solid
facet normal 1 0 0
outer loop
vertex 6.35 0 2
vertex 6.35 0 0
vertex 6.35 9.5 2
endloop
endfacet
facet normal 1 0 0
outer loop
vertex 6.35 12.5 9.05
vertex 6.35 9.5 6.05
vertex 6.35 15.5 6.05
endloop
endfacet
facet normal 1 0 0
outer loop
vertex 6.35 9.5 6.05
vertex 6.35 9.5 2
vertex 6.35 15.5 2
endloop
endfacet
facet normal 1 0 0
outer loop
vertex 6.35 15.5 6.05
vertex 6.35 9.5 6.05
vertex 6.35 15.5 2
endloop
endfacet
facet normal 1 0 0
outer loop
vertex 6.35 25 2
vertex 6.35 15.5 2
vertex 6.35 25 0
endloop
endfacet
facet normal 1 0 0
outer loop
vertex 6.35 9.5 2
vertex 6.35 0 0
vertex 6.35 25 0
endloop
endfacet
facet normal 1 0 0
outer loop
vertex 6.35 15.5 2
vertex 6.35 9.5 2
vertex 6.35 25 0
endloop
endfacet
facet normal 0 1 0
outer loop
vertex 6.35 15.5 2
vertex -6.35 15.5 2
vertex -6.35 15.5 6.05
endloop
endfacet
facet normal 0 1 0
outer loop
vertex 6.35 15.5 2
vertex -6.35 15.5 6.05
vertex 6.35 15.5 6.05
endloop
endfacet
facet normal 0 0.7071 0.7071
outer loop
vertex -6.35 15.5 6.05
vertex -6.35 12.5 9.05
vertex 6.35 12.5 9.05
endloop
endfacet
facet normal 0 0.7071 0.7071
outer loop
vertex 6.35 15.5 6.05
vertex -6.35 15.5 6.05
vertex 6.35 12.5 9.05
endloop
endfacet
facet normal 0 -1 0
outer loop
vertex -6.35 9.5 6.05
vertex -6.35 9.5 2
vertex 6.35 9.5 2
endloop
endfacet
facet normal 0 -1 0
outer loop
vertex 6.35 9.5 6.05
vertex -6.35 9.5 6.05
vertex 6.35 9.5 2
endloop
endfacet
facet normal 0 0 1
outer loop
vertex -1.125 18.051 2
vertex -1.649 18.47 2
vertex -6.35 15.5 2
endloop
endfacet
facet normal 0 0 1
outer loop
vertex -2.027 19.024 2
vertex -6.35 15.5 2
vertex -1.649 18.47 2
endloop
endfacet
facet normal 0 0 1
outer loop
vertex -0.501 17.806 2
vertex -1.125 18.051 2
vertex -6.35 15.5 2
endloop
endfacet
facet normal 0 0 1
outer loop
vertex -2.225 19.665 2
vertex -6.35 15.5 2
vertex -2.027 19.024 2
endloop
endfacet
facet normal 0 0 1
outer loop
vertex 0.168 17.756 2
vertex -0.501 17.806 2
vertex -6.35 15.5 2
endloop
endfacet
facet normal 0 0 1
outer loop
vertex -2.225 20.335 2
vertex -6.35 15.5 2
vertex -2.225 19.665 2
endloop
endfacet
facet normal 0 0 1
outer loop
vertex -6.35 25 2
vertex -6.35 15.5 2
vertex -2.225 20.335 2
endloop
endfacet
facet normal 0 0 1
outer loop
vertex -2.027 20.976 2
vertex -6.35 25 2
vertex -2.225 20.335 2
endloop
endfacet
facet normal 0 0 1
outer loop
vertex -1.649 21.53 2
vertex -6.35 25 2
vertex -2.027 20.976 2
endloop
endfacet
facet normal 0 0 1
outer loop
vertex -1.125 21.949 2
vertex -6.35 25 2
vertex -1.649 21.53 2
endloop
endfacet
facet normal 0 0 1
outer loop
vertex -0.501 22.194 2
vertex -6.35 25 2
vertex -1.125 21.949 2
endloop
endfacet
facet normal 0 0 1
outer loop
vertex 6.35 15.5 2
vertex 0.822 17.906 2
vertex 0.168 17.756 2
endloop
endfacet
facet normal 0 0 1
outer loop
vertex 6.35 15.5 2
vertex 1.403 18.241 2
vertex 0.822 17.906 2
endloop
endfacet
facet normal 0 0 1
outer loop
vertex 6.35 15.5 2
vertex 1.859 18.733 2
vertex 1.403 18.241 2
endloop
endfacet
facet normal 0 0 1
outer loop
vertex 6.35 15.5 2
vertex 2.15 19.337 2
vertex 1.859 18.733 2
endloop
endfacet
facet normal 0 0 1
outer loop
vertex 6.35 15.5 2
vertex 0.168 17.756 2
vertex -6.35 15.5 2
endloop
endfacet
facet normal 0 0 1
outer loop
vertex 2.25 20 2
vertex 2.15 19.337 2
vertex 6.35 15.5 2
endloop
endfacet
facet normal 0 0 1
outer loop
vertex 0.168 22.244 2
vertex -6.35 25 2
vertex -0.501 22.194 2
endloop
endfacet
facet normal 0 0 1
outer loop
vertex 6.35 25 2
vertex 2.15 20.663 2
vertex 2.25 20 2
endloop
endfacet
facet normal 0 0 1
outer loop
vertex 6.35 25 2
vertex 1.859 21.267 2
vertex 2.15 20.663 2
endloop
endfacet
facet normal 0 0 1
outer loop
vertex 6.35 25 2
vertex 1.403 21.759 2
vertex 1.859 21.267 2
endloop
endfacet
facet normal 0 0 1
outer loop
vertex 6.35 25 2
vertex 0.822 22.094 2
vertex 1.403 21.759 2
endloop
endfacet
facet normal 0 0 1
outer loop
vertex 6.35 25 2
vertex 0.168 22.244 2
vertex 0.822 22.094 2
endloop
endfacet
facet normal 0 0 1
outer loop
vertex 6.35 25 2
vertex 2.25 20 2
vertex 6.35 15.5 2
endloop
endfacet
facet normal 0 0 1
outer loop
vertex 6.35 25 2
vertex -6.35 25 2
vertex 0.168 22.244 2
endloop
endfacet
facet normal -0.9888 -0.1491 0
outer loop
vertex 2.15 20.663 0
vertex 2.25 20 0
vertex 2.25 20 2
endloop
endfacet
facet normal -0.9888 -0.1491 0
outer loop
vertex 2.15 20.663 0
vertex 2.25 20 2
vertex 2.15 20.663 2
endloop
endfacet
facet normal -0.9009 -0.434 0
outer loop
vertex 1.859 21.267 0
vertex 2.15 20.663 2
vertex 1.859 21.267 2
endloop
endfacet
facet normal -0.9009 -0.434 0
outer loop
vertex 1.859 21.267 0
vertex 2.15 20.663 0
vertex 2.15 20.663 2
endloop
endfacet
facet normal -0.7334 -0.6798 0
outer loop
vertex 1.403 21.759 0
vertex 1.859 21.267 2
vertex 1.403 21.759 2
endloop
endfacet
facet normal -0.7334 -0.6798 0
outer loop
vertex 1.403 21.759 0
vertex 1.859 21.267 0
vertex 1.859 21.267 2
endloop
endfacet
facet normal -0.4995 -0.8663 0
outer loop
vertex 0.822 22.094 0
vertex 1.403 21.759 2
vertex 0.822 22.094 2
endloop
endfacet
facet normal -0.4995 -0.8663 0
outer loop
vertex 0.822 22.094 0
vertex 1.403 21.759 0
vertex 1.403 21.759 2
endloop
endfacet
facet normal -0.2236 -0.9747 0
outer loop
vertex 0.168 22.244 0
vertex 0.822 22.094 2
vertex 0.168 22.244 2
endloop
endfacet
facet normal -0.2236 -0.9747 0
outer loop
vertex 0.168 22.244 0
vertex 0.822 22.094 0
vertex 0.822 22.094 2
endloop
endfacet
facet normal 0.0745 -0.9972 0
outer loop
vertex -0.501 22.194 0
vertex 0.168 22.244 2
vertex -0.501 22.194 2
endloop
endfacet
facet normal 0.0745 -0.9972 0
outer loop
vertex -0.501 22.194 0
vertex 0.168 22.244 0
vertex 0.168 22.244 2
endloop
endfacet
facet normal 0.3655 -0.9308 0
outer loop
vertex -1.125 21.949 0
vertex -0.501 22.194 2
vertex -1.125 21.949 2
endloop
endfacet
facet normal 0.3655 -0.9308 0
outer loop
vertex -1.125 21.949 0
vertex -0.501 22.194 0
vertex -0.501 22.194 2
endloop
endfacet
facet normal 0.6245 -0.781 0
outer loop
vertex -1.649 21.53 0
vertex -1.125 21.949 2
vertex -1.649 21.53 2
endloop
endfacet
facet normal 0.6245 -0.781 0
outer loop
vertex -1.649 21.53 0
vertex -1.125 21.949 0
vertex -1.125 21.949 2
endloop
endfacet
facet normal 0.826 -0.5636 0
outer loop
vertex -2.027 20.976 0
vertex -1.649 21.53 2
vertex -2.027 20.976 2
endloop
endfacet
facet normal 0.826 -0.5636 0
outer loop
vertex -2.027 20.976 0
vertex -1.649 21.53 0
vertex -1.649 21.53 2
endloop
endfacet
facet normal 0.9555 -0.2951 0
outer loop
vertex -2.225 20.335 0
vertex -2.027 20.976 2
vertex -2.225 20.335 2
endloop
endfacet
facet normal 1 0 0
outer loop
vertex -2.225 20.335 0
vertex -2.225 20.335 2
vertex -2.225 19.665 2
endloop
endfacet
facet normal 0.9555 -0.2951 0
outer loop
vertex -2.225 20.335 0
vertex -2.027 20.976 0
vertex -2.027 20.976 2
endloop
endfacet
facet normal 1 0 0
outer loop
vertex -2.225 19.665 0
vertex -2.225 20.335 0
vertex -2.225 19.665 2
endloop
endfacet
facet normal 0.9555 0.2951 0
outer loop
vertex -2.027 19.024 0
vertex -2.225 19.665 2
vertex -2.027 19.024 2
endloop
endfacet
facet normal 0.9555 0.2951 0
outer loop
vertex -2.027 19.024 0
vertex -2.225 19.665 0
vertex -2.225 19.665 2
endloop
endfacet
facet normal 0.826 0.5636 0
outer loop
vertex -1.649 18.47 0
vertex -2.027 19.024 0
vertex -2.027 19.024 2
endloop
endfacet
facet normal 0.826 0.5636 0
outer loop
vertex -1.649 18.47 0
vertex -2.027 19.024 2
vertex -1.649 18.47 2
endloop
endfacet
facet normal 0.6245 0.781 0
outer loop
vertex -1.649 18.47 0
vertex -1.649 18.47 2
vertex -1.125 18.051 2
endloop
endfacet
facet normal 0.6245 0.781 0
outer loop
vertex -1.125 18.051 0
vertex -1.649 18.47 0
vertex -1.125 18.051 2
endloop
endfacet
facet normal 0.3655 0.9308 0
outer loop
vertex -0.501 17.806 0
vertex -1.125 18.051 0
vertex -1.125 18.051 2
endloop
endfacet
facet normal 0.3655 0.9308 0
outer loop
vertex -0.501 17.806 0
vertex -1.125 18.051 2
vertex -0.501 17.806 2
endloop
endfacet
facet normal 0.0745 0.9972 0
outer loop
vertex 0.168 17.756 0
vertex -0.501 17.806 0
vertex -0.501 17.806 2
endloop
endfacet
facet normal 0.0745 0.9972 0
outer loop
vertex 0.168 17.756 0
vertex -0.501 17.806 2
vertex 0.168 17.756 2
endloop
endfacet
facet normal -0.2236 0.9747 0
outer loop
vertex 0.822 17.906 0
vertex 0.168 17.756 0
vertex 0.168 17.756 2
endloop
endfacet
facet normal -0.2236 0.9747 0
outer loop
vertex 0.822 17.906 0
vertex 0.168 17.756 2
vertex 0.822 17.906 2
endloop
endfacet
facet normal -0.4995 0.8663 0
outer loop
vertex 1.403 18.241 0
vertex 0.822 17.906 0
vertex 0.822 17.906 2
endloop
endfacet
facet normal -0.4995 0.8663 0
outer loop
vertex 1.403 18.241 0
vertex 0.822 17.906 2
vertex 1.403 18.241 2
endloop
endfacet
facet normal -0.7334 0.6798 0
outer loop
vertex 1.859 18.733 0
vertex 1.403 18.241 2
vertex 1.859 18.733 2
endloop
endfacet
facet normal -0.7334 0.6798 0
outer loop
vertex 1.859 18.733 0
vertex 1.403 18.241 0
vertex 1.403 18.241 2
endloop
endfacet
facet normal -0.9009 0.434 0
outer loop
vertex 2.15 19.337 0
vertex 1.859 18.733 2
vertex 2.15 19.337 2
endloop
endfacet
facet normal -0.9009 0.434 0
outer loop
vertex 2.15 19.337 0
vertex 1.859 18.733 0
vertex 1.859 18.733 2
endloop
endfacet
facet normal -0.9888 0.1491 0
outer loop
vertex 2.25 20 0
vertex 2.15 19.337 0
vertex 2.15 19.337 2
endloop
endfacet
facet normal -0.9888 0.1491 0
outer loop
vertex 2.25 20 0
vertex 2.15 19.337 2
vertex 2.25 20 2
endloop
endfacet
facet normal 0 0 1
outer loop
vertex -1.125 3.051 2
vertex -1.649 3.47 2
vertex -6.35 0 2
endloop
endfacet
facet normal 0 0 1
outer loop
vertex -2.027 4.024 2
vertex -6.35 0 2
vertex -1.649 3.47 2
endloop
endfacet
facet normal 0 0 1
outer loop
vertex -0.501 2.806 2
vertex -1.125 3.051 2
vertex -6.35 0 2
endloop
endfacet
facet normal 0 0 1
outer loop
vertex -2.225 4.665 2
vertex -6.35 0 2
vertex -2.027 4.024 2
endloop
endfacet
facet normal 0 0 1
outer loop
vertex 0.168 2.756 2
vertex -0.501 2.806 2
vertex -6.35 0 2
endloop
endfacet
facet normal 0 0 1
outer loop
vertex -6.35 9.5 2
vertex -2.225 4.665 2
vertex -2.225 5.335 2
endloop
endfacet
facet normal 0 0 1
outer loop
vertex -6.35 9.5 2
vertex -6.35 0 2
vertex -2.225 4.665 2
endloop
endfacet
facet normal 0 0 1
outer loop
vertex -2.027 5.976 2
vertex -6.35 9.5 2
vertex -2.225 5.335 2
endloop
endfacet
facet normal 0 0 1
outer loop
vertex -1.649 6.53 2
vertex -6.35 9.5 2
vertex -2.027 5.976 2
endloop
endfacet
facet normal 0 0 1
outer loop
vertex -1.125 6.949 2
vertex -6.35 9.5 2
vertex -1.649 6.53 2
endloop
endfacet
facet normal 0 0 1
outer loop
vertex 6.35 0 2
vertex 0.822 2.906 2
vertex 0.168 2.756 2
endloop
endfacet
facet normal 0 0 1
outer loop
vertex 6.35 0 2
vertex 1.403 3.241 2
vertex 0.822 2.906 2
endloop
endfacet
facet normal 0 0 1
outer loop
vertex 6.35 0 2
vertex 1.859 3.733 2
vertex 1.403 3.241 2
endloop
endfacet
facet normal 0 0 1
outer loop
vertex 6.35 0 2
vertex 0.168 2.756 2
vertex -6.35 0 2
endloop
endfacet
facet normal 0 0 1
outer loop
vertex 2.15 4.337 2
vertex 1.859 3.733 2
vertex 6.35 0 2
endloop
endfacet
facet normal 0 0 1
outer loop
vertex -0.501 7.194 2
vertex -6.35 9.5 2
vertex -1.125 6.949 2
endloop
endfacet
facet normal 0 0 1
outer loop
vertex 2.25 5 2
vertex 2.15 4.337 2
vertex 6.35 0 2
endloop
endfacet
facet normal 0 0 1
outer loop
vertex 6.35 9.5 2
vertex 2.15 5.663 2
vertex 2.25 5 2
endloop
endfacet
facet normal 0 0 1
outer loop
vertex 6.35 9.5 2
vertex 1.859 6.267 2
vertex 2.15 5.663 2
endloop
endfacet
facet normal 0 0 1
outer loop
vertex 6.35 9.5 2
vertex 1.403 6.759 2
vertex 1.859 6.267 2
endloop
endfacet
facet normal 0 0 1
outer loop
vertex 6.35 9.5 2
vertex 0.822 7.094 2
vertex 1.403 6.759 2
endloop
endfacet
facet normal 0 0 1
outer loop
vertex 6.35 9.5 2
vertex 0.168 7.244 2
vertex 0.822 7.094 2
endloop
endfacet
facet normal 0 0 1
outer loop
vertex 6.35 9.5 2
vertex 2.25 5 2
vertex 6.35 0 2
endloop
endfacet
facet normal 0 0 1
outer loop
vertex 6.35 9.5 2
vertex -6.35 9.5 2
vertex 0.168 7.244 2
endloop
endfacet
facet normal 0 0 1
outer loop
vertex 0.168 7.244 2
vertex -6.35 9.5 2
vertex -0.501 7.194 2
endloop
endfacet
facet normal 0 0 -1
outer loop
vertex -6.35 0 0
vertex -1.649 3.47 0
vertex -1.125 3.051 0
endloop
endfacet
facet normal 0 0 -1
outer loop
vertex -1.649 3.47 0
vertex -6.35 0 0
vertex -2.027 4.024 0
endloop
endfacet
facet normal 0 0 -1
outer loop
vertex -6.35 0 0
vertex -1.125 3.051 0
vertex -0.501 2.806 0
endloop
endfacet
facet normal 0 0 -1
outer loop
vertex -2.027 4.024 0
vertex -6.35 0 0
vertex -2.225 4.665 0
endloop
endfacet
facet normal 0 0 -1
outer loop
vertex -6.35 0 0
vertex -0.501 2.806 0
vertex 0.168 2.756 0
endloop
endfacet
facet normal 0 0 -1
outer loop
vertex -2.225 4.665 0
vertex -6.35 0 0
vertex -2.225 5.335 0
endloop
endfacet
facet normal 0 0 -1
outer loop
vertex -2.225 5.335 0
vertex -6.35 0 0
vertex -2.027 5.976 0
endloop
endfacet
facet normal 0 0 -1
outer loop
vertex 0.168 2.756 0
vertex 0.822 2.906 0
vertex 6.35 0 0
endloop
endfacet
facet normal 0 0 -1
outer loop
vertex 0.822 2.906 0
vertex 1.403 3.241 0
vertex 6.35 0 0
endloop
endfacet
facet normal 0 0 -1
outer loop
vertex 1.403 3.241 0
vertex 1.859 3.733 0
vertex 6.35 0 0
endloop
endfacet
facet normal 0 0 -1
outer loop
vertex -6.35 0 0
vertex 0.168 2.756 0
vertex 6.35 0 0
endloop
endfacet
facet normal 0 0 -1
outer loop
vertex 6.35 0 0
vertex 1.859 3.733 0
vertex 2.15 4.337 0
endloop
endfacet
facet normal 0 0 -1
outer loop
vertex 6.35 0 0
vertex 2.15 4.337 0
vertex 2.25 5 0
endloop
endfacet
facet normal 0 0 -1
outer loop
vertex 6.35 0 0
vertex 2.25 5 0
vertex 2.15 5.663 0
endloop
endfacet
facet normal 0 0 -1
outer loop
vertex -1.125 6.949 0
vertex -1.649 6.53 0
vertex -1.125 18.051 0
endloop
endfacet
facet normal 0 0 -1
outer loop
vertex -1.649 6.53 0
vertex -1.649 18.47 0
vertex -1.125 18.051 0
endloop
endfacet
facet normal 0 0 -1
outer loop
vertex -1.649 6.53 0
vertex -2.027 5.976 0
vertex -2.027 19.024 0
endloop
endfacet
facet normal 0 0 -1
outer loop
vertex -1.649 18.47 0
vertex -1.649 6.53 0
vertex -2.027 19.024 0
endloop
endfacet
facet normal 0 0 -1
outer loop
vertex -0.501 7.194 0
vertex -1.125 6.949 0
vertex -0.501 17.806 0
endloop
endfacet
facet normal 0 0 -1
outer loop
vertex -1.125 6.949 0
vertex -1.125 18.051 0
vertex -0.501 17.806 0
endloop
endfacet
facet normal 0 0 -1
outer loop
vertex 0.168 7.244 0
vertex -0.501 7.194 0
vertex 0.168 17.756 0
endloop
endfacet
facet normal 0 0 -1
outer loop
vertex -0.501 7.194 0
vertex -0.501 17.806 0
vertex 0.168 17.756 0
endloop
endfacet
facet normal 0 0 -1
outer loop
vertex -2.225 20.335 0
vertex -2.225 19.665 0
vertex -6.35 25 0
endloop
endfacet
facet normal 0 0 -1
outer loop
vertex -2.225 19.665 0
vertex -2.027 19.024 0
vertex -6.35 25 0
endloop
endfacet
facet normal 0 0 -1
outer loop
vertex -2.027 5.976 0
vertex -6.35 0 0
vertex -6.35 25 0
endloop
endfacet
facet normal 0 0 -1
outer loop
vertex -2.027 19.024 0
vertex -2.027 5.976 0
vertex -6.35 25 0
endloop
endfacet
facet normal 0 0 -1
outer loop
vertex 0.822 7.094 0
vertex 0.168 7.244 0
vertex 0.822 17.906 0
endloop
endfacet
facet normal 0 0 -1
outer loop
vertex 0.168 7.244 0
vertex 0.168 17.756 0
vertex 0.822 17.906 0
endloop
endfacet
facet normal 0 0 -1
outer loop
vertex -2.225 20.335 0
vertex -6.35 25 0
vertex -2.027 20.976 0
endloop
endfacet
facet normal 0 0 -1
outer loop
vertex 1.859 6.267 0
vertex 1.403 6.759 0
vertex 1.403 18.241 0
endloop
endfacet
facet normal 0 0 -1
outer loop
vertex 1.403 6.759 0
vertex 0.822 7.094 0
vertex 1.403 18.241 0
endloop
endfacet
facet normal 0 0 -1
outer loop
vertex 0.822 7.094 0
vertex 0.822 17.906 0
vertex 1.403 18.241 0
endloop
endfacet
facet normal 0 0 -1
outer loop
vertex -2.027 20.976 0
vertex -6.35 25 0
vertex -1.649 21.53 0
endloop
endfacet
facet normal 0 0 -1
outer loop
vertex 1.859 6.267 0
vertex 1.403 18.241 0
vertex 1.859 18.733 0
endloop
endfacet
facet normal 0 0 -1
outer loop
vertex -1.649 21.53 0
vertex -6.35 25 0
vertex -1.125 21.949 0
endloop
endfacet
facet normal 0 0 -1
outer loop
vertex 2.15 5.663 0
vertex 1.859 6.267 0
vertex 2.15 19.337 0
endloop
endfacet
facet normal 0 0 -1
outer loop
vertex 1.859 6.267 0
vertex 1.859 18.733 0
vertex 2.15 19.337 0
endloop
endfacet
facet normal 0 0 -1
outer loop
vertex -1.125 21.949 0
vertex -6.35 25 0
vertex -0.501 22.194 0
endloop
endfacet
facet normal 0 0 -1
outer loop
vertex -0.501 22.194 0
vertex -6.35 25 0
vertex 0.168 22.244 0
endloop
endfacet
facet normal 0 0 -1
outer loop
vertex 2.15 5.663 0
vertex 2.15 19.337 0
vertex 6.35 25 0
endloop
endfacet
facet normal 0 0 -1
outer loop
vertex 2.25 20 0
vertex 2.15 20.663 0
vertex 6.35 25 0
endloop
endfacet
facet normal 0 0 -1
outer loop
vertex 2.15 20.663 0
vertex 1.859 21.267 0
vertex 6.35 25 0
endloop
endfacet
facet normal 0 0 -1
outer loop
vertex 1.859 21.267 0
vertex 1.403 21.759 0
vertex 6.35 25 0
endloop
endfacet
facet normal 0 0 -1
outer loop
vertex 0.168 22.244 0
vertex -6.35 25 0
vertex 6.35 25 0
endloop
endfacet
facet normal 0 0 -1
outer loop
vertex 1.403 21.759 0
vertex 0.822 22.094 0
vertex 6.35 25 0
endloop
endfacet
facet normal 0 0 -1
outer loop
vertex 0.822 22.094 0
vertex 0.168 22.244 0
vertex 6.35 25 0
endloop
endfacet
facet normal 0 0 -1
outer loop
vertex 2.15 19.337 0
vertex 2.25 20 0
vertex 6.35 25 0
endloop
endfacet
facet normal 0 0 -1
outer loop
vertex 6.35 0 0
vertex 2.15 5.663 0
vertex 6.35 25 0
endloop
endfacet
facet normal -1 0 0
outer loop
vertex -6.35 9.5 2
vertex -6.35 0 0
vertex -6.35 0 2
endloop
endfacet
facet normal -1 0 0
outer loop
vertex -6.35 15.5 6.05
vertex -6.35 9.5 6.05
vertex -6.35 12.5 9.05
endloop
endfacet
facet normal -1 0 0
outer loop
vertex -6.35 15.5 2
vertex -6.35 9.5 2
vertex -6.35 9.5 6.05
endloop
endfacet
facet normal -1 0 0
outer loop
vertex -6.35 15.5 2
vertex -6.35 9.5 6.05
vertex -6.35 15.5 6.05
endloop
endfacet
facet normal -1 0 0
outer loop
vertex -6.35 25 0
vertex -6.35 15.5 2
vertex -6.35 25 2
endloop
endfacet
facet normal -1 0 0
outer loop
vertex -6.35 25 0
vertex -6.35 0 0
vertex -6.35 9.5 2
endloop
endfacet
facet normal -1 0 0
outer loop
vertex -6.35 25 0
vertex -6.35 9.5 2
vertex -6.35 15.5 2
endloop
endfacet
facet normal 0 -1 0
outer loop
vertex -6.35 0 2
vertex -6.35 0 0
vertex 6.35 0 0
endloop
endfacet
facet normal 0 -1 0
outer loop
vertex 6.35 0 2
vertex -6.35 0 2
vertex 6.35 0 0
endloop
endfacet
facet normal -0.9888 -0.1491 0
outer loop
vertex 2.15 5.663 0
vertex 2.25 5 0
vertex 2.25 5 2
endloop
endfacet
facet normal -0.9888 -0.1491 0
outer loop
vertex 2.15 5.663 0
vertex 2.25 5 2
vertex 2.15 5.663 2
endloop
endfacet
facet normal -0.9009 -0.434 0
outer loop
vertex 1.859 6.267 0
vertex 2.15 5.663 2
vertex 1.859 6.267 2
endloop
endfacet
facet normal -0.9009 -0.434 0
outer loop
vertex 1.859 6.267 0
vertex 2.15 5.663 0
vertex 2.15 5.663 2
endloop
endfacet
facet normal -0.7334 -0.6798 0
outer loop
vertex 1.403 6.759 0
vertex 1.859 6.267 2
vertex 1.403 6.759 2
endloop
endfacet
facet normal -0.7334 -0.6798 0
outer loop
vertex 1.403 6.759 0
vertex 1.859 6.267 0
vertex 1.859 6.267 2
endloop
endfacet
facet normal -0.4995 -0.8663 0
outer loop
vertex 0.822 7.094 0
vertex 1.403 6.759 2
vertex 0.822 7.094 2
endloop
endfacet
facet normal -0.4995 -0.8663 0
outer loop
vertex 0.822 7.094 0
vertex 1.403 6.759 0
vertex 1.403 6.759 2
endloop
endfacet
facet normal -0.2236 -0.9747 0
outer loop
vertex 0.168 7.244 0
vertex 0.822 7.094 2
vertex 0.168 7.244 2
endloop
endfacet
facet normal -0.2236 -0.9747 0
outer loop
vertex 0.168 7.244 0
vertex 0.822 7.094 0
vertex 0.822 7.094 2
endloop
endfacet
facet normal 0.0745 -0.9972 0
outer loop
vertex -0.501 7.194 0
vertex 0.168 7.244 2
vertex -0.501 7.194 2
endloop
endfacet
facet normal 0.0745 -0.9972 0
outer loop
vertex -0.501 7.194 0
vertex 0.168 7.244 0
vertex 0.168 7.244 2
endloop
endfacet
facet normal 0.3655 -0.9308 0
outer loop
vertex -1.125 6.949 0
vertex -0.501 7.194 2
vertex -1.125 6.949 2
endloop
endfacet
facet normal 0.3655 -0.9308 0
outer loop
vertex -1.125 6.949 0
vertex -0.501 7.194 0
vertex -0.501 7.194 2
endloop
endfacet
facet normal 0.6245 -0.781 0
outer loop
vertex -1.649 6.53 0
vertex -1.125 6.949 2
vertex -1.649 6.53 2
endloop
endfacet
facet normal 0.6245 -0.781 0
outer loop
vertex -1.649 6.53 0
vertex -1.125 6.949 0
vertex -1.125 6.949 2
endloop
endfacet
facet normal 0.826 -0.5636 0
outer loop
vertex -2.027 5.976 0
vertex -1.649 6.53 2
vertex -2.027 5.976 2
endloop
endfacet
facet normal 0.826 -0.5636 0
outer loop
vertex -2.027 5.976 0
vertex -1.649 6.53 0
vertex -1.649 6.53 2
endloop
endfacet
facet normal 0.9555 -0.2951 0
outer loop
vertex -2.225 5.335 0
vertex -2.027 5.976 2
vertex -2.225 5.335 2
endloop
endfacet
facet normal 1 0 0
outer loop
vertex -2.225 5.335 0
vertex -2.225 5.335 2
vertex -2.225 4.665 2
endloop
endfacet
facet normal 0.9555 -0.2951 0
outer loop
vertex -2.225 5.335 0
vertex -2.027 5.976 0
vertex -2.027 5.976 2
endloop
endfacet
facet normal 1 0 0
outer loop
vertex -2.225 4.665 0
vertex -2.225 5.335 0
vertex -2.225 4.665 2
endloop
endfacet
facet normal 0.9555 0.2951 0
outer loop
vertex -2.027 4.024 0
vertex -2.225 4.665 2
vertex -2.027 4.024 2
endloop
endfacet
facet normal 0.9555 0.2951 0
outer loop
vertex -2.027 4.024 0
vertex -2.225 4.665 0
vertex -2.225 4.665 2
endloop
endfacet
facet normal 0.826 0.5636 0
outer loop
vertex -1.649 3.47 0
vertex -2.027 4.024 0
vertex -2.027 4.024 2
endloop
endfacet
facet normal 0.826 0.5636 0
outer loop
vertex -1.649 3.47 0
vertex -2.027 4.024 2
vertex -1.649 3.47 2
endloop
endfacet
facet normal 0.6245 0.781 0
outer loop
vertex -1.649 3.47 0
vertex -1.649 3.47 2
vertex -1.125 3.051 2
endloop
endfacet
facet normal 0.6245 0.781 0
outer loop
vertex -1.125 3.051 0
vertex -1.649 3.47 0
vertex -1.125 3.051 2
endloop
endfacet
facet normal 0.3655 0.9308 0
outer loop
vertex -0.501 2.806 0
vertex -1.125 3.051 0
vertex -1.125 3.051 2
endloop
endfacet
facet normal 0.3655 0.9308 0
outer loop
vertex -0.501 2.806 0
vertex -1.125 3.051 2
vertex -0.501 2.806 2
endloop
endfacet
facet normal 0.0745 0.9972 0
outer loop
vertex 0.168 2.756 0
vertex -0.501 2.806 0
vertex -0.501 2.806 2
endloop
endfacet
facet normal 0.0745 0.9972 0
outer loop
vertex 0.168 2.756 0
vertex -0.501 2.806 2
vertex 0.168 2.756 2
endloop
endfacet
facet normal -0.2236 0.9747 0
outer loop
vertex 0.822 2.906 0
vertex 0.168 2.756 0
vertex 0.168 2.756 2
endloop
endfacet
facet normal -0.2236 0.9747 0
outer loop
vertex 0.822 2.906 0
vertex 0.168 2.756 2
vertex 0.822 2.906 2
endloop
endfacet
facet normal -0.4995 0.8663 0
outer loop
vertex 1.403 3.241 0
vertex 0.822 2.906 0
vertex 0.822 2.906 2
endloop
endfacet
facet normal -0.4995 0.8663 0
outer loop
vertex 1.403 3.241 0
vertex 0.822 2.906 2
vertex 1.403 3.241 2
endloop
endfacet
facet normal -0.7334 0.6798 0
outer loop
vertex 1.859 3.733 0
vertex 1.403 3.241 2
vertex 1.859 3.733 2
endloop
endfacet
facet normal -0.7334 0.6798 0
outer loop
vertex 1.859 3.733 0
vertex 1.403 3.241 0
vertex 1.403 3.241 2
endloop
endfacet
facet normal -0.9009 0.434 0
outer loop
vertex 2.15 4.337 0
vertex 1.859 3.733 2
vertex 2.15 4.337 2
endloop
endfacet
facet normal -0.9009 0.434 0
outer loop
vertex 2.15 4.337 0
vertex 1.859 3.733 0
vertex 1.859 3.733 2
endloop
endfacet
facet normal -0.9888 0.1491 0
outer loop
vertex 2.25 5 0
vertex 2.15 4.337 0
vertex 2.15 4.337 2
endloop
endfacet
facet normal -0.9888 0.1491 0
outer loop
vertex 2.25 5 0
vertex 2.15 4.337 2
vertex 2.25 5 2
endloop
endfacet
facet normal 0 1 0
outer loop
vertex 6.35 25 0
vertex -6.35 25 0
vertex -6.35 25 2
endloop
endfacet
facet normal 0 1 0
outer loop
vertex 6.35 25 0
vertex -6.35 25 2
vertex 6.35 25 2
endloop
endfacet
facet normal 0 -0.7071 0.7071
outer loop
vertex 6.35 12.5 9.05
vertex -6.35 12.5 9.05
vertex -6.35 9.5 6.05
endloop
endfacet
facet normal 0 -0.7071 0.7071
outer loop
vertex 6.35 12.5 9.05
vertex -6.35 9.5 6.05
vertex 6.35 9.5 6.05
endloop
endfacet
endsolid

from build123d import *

# Parameters (mm, degrees)
SKETCH2_W           = 12.7
SKETCH2_H           = 25
SKETCH2_R           = 2.25
BOSS_EXTRUDE1_DEPTH = 2
SKETCH3_W           = 12.7
SKETCH3_H           = 6
BOSS_EXTRUDE2_DEPTH = 7.05
CHAMFER1_SIZE       = 3


with BuildPart() as part:
    # Sketch2 → Boss-Extrude1 (new body)
    with BuildSketch(Plane.XY):
        with Locations((0, 12.5)):
            Rectangle(SKETCH2_W, SKETCH2_H)
        with Locations((0, 5)):
            Circle(SKETCH2_R, mode=Mode.SUBTRACT)
        with Locations((0, 20)):
            Circle(SKETCH2_R, mode=Mode.SUBTRACT)
    extrude(amount=BOSS_EXTRUDE1_DEPTH)

    # Sketch3 → Boss-Extrude2 (add)
    with BuildSketch(Plane.XY.offset(2)):
        with Locations((0, 12.5)):
            Rectangle(SKETCH3_W, SKETCH3_H)
    extrude(amount=BOSS_EXTRUDE2_DEPTH)

    # Chamfer1
    chamfer1_edges = [part.edges().sort_by_distance(p)[0] for p in [
        (0, 9.5, 9.05),
        (0, 15.5, 9.05),
    ]]
    chamfer(chamfer1_edges, length=CHAMFER1_SIZE - 0.0001)  # a hair under: the kernel refuses the full size


solid = part.part
